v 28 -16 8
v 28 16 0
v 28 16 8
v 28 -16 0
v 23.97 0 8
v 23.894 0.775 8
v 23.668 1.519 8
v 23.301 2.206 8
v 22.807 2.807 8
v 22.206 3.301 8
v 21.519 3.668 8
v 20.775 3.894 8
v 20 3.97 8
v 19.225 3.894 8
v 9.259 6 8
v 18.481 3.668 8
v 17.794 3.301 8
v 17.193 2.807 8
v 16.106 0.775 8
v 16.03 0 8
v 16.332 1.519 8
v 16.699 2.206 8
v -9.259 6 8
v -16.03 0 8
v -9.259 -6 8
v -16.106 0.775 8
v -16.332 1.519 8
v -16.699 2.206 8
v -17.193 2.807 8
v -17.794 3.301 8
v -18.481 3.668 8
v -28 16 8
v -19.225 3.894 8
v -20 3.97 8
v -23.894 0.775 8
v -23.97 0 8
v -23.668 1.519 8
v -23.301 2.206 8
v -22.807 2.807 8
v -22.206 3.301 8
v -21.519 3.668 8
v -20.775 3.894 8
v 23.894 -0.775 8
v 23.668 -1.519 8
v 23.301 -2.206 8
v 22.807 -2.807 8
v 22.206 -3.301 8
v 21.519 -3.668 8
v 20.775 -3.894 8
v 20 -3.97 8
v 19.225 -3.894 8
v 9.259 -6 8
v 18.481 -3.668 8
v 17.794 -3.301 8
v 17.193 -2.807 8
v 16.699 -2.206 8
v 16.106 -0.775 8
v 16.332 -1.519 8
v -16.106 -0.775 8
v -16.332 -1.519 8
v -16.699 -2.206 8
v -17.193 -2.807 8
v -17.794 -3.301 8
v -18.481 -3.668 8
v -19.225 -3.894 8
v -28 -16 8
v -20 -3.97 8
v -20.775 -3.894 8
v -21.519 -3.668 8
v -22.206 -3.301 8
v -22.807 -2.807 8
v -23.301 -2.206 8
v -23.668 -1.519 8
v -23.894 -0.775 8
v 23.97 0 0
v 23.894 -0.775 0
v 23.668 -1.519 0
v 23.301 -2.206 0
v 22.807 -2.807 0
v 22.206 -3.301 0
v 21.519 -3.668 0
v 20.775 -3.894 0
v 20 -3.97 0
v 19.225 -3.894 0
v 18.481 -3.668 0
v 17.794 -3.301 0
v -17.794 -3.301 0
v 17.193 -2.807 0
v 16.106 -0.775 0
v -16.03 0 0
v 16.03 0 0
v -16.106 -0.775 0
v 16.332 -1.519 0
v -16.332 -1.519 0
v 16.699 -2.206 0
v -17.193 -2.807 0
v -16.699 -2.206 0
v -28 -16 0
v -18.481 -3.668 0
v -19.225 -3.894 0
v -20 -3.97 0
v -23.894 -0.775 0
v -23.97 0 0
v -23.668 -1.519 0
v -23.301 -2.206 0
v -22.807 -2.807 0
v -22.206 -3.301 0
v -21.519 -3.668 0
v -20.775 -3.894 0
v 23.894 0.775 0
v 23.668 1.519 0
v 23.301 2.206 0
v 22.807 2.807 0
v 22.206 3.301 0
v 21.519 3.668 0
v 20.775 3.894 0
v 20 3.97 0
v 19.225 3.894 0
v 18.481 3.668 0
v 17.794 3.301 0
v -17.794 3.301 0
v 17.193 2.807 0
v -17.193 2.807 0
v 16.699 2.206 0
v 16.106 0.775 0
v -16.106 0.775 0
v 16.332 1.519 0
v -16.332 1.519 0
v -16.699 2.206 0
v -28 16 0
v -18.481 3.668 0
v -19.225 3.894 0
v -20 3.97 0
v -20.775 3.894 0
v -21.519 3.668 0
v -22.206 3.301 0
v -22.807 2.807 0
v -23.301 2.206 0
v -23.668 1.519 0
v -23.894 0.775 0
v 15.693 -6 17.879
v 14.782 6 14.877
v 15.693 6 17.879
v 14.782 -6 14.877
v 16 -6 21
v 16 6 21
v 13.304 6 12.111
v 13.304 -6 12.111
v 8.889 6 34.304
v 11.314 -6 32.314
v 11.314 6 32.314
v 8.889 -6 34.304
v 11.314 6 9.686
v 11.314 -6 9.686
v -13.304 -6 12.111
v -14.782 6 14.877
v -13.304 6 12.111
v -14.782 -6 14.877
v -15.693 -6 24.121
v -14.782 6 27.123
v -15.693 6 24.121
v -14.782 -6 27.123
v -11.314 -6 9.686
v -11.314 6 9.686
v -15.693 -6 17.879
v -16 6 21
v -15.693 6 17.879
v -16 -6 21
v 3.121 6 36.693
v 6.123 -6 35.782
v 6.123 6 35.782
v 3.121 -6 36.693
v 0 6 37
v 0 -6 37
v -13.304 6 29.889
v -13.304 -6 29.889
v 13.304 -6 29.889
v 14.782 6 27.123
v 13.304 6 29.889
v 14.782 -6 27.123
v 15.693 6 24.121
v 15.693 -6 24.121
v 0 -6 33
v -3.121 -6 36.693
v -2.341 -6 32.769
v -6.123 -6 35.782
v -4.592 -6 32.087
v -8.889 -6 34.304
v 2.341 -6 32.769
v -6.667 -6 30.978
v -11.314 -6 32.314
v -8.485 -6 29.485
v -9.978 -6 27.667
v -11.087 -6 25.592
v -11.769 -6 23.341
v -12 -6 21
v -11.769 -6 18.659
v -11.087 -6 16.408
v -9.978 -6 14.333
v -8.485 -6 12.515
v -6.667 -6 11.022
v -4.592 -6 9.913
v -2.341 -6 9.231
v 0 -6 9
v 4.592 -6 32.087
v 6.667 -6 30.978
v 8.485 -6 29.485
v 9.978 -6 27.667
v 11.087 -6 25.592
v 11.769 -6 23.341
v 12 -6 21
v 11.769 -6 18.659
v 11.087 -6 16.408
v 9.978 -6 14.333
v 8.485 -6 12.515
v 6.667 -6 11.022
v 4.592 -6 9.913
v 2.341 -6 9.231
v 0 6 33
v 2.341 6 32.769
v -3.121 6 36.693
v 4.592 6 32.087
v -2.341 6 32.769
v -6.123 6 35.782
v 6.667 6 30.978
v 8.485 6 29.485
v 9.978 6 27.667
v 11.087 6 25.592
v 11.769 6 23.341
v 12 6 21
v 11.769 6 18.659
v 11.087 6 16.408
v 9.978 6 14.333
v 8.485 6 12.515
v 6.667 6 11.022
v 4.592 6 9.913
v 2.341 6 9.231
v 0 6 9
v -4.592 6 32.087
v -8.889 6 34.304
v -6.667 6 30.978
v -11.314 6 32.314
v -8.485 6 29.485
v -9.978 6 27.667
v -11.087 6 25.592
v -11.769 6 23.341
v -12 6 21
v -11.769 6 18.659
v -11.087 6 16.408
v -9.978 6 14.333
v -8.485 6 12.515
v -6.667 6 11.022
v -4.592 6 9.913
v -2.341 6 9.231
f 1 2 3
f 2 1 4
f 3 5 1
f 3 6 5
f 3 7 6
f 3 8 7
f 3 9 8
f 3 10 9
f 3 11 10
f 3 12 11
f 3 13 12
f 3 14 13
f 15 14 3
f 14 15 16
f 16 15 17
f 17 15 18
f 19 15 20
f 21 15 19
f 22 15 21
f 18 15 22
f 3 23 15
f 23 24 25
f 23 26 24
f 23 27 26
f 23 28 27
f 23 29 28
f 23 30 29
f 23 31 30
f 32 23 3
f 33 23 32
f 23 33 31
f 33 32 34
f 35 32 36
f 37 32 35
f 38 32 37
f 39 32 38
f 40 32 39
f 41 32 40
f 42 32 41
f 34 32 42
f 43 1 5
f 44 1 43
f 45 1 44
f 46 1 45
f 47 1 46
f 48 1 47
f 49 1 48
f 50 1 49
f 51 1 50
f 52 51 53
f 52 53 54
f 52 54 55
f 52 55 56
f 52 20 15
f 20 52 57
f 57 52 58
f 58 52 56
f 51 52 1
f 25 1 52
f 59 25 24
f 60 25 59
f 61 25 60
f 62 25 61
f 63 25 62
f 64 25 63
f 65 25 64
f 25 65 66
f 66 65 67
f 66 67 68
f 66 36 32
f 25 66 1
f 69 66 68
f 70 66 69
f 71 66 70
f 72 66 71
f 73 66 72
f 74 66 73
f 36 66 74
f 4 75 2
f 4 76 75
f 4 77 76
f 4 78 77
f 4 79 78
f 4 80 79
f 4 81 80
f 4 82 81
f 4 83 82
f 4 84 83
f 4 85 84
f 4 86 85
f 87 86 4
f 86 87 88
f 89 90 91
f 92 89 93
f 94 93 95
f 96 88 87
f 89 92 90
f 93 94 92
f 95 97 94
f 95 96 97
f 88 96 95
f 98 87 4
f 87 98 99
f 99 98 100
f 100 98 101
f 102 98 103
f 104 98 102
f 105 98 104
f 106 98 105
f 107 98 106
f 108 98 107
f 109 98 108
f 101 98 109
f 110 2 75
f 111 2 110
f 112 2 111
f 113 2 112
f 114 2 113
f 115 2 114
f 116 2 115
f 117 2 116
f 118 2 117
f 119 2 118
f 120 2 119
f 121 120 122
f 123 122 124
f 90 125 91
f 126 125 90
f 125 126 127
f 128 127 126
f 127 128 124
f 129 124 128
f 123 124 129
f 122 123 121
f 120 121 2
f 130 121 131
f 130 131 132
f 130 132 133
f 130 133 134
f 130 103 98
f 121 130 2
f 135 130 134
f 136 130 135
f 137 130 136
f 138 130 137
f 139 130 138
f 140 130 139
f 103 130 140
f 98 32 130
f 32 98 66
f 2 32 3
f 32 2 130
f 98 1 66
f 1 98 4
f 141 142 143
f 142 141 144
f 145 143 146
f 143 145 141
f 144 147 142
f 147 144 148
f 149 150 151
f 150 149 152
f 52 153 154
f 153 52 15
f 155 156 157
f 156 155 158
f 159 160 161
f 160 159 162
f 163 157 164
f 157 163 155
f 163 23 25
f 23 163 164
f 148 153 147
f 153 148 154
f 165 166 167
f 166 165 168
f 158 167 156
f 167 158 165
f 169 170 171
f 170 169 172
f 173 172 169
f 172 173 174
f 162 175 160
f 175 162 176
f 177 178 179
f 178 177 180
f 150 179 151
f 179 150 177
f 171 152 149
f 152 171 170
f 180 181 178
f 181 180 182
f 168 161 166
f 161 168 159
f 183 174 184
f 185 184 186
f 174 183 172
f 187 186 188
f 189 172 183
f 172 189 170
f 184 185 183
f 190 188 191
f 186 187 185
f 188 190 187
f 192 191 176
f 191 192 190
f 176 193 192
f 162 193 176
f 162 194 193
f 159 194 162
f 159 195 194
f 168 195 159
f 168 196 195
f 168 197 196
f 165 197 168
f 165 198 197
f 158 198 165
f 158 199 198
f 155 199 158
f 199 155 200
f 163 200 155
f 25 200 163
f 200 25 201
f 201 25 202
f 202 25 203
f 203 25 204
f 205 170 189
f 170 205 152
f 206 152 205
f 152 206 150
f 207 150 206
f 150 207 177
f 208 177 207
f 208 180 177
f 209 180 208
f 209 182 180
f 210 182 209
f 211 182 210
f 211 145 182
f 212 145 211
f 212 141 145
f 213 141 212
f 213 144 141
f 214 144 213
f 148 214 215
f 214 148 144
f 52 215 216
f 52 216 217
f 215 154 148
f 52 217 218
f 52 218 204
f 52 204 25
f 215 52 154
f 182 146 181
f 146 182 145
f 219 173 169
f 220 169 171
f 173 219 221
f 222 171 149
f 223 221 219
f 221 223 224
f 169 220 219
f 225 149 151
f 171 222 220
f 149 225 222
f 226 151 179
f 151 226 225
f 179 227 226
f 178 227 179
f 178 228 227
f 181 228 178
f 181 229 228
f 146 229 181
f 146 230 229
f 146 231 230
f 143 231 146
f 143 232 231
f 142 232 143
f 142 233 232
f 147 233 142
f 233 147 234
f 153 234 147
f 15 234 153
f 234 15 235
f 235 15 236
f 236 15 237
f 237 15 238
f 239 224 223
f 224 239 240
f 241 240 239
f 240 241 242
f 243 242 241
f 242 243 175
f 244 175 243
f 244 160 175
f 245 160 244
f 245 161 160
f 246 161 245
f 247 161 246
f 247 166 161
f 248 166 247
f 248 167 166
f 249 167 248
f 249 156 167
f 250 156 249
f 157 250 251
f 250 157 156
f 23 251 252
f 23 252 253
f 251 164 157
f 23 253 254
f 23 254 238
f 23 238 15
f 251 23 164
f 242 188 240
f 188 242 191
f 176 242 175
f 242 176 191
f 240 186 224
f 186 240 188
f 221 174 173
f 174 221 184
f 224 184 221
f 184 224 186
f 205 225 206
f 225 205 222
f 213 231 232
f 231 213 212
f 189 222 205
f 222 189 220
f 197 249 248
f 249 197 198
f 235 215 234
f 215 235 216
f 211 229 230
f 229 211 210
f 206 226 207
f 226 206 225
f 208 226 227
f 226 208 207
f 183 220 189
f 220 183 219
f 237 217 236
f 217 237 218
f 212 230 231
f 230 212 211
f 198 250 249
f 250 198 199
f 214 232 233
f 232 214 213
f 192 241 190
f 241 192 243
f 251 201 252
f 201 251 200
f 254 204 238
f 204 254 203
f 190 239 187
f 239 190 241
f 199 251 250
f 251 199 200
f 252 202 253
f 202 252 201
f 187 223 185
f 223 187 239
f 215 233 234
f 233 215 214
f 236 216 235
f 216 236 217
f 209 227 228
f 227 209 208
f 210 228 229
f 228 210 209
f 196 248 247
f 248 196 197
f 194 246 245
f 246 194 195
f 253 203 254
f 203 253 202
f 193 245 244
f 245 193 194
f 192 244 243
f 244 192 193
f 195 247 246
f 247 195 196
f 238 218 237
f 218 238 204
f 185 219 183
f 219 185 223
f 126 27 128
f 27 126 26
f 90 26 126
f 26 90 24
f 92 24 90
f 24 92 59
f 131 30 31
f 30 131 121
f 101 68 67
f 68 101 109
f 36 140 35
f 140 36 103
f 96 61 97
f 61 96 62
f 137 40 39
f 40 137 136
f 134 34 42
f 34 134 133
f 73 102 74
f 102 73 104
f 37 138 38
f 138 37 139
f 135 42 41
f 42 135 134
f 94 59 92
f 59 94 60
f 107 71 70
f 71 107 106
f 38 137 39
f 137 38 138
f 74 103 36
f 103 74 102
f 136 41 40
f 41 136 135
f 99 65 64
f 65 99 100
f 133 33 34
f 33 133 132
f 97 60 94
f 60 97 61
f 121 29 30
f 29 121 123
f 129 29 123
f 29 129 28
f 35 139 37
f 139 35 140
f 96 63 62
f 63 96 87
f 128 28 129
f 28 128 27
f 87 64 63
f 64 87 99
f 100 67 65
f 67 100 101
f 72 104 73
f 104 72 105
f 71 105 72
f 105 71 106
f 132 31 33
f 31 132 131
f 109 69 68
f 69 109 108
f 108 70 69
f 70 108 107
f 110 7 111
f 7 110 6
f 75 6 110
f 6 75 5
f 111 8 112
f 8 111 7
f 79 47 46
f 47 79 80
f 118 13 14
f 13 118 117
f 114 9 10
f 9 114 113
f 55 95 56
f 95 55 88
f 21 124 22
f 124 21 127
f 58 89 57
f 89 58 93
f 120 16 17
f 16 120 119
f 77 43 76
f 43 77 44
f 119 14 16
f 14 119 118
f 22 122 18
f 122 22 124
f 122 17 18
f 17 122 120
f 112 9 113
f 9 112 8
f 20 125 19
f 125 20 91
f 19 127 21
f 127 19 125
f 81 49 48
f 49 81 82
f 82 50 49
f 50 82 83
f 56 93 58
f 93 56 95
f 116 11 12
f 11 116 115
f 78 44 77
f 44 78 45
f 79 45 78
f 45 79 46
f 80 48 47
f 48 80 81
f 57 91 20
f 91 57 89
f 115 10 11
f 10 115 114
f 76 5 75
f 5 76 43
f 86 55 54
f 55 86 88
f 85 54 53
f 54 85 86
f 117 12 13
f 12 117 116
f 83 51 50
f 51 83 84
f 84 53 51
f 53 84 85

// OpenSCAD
$fn = 32;

// ----------------------------------------------------------------------
// Deck eye: 32 mm eye on a 56 mm base
// ----------------------------------------------------------------------

// --- parameters (mm) ---
base_l = 56;              // base length
base_w = 32;              // base width
base_t = 8;               // base thickness
eye_r = 16;               // eye outside radius
eye_bore = 24;            // eye bore diameter
eye_w = 12;               // eye thickness
eye_z = 21;               // eye centre height
holes_d = 7.94;           // fixing holes
hole_x = 20;              // fixing hole spacing

difference() {
  union() {
    translate([-28, -16, 0]) cube([base_l, base_w, base_t]);
    /* eye standing upright, its foot sunk 3 mm into the base */
    translate([0, -6, 21]) rotate([-90, 0, 0]) cylinder(h = 12, d = 32);
  }
  /* eye bore, 2.5 mm clear of both faces */
  translate([0, -8.5, 21]) rotate([-90, 0, 0]) cylinder(h = 17, d = 24);
  translate([-20, 0, -2.5]) cylinder(h = base_t + 5, d = holes_d);
  translate([20, 0, -2.5]) cylinder(h = base_t + 5, d = holes_d);
}
